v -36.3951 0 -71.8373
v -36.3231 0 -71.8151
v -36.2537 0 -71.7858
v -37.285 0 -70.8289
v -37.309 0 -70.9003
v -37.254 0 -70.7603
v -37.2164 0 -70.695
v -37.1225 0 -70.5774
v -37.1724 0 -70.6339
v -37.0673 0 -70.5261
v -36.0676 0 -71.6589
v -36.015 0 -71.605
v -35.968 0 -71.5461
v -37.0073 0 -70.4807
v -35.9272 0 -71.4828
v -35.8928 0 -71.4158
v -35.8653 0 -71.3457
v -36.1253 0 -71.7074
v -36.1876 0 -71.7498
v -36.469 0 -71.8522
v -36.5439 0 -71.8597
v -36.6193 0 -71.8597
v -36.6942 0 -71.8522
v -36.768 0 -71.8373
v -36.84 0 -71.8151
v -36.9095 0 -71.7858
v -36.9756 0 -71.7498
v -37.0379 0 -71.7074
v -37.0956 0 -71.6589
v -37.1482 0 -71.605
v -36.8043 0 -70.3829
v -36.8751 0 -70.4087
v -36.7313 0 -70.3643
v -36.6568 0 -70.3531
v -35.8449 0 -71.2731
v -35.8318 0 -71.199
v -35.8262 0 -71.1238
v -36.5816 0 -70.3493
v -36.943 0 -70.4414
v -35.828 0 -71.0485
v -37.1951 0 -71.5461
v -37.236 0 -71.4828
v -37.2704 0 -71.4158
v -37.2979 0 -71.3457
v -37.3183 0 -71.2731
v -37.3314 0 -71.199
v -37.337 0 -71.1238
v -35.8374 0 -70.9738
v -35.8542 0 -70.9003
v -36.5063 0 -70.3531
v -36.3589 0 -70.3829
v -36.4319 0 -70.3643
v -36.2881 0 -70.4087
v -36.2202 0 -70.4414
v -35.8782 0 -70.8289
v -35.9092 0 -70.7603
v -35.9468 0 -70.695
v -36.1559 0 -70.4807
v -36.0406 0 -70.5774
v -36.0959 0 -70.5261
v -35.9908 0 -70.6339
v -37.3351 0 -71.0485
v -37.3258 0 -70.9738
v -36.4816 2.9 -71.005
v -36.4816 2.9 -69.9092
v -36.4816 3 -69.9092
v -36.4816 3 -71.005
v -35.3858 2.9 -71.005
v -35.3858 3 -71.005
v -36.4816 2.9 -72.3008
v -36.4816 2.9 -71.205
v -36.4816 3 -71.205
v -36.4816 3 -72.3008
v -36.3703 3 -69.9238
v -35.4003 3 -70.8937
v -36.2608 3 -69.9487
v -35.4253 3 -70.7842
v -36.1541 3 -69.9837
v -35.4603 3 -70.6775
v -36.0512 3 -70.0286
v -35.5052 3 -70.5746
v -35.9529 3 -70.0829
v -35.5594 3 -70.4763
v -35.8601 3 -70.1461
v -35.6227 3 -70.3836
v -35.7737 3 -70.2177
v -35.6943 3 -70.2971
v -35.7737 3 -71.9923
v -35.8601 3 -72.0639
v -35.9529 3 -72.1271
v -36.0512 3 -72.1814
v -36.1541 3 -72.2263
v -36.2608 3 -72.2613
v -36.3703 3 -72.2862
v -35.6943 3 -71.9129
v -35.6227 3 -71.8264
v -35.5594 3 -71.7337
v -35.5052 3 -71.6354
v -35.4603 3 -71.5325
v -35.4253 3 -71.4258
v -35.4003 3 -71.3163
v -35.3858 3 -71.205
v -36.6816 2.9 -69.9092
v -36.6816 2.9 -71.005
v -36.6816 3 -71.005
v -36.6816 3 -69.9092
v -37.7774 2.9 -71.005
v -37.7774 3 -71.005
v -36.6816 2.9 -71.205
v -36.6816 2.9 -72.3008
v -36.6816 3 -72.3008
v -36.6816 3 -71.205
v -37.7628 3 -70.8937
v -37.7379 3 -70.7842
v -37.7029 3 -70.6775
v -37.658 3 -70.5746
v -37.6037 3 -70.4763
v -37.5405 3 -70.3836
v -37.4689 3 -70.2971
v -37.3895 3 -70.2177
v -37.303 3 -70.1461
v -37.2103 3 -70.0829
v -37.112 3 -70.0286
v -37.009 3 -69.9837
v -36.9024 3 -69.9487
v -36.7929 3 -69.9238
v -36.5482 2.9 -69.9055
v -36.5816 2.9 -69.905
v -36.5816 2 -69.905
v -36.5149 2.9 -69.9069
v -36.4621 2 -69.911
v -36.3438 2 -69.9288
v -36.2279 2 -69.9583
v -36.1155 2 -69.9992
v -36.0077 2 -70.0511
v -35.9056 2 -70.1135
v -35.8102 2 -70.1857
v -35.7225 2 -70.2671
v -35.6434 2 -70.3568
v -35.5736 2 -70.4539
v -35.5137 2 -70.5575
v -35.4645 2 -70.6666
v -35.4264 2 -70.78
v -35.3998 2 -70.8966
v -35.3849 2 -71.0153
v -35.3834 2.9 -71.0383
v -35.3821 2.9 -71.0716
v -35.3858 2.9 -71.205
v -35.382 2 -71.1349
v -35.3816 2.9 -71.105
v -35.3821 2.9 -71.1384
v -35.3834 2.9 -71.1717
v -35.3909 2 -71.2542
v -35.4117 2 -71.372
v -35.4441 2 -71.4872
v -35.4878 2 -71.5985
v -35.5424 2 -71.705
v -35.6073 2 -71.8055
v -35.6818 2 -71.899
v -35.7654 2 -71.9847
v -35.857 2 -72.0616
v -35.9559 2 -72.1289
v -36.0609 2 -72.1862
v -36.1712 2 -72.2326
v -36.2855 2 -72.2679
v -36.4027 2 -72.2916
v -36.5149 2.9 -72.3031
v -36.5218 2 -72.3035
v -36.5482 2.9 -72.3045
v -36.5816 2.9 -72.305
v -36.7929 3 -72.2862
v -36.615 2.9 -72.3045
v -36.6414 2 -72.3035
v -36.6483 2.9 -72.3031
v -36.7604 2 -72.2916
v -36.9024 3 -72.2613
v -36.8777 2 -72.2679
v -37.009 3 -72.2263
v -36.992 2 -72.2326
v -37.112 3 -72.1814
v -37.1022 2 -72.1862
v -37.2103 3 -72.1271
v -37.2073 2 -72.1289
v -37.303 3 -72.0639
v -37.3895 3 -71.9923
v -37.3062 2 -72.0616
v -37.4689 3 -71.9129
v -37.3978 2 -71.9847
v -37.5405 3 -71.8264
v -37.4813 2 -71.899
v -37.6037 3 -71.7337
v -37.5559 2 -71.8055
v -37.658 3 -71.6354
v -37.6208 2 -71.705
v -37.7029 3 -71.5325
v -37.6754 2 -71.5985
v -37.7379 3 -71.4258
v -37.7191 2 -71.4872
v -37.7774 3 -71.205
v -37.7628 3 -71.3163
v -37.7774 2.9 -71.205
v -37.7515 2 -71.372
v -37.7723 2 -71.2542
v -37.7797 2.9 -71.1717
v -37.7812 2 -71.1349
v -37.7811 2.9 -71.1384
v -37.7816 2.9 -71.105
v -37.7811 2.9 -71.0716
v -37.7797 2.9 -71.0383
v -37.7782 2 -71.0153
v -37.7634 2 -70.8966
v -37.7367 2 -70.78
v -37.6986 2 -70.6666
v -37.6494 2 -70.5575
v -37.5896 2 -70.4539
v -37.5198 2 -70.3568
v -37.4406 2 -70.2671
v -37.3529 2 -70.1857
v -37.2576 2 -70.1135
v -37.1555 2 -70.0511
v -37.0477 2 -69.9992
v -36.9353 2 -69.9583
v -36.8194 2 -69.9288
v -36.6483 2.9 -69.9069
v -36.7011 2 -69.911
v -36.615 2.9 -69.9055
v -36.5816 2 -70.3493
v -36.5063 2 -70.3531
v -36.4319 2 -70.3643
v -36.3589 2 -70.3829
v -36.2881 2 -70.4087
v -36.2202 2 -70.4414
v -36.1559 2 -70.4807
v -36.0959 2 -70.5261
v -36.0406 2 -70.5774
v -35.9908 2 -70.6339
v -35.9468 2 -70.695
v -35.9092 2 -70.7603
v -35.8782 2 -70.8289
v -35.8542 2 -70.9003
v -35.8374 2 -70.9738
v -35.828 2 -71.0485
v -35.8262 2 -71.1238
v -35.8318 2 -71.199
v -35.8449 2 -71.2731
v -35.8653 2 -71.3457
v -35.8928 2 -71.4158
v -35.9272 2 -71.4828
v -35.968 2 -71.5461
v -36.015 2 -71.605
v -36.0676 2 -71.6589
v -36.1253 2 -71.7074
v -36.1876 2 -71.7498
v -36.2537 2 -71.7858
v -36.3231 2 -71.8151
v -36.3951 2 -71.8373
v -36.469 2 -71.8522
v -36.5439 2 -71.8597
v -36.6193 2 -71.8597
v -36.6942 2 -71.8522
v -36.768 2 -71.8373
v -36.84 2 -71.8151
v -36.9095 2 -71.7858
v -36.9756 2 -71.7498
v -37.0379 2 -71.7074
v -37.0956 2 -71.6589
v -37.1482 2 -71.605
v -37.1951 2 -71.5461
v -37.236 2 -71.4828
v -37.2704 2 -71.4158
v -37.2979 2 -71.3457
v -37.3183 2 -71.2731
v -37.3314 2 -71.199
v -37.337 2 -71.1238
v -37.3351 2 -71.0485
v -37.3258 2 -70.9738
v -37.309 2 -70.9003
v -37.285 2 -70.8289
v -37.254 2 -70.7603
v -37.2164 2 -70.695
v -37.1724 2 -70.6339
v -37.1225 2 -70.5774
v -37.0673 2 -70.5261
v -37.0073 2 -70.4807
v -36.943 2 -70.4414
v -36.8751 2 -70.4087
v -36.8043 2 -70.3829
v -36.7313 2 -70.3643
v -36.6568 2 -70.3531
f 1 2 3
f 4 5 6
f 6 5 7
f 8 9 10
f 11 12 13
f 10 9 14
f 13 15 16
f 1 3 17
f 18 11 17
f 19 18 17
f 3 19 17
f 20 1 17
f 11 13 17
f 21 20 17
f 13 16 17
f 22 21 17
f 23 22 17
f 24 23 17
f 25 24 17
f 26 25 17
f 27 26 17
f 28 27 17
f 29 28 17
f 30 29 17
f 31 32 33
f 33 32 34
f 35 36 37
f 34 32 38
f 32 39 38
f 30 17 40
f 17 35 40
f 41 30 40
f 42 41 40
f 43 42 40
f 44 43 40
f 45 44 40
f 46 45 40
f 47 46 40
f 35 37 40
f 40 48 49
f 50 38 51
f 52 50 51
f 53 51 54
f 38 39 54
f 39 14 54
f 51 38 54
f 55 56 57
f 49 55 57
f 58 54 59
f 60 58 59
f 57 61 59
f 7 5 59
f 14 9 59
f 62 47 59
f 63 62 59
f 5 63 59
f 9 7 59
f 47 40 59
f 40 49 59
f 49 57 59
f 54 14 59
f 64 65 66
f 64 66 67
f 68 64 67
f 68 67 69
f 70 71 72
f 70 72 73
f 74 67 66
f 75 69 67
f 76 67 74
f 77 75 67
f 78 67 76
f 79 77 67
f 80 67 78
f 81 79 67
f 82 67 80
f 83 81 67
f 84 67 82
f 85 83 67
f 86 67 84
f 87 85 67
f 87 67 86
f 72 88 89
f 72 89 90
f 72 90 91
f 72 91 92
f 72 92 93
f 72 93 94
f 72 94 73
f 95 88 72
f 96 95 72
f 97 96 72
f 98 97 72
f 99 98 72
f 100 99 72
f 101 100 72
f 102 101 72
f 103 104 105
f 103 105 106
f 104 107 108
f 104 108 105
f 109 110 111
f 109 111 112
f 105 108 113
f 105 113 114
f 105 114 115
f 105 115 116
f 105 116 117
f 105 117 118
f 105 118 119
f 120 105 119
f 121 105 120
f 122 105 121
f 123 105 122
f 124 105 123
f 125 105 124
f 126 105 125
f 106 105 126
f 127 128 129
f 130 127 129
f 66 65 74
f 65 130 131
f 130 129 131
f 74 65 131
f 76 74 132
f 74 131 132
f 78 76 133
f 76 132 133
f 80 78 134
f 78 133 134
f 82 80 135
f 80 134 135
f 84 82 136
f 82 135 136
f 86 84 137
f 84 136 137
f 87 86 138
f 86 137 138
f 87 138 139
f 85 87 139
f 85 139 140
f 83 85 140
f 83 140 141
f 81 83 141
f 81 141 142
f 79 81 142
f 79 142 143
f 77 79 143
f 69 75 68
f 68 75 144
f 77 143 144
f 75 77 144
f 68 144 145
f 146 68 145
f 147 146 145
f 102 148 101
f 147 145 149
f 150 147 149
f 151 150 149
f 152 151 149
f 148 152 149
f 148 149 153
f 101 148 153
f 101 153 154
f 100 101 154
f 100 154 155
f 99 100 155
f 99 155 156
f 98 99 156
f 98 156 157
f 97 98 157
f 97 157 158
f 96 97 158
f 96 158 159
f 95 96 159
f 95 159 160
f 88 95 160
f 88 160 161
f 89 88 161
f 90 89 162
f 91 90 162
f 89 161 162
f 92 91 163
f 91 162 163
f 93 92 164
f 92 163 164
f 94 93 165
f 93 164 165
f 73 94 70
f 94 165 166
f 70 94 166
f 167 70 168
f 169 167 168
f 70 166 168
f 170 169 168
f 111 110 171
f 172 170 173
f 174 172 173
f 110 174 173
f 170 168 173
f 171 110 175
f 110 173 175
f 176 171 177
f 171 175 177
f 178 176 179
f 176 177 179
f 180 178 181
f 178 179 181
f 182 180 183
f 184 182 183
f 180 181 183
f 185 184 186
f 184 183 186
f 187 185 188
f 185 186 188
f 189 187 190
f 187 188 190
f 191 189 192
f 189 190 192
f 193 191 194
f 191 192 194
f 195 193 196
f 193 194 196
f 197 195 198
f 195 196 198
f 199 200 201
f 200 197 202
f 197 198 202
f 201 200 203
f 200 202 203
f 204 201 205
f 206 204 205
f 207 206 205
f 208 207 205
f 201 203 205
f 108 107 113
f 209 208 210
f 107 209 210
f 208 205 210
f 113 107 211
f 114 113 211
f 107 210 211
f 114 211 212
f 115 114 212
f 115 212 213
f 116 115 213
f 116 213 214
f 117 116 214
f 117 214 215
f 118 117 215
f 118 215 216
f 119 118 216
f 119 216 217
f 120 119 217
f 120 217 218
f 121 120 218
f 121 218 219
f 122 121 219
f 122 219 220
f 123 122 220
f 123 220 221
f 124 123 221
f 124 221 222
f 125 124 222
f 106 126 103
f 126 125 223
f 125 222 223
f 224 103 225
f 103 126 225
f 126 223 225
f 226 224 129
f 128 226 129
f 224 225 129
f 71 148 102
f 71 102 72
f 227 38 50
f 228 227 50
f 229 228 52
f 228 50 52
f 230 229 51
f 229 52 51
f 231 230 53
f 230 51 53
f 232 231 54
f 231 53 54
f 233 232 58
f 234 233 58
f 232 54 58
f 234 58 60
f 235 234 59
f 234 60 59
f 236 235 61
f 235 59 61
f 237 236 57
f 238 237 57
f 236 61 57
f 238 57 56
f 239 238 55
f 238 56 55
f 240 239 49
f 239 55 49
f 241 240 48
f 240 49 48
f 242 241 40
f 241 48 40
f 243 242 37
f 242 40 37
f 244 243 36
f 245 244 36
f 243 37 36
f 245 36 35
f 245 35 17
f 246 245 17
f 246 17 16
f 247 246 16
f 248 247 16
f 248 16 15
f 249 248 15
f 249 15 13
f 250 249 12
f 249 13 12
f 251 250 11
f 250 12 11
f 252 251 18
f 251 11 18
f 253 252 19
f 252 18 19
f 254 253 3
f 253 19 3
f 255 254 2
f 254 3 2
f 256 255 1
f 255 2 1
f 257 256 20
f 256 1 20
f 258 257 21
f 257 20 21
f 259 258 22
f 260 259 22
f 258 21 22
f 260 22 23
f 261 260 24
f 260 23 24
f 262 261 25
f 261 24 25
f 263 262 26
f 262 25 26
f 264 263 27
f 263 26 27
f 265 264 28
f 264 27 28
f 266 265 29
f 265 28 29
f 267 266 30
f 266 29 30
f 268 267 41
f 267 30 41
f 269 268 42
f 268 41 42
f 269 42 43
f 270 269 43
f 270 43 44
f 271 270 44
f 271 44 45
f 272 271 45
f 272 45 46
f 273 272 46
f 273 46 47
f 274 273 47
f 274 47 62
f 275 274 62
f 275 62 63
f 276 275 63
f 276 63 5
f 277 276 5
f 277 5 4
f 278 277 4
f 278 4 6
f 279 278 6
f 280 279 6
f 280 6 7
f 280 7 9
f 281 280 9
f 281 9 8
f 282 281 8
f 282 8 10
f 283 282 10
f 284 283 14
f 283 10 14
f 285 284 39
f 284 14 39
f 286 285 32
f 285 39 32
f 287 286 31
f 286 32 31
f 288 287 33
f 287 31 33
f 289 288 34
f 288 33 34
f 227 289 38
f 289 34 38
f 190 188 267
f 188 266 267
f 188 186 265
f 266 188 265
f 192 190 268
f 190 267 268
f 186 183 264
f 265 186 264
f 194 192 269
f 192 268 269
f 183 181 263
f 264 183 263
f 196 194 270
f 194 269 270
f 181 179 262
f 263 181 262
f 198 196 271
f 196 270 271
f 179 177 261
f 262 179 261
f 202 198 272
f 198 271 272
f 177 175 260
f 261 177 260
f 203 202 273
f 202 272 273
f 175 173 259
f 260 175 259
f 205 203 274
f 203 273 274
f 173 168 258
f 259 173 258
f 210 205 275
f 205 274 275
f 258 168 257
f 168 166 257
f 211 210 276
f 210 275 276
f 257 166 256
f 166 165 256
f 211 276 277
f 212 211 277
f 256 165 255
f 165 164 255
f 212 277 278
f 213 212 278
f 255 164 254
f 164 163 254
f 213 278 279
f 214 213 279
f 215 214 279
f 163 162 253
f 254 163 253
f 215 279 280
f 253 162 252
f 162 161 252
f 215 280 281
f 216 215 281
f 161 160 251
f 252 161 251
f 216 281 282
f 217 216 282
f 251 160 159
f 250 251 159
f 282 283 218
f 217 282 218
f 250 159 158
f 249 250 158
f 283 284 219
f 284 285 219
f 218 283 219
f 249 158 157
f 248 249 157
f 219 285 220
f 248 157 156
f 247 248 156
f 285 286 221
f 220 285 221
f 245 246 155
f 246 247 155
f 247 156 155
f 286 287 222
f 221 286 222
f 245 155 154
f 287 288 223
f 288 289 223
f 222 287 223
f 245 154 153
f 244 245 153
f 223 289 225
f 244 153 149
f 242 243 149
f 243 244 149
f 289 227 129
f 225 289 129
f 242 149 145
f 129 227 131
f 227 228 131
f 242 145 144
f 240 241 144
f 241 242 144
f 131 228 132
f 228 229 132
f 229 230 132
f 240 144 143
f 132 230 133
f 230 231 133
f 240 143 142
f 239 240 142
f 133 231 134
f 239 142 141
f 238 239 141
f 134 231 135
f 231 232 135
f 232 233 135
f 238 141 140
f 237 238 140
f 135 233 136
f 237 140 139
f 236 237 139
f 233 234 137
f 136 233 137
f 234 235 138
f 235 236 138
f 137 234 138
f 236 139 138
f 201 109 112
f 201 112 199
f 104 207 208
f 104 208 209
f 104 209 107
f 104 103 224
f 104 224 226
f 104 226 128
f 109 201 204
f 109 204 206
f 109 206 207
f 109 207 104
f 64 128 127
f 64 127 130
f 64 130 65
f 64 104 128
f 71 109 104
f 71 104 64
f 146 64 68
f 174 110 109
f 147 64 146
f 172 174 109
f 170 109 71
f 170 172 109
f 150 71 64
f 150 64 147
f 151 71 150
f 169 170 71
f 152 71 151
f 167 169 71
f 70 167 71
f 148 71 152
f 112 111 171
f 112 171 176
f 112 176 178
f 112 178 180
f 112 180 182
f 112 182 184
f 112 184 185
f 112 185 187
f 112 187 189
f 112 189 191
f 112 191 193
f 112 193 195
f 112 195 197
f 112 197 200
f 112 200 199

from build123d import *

# Parameters (mm, degrees)
SKETCH1_R           = 0.75565
BOSS_EXTRUDE1_DEPTH = 2
SKETCH2_R           = 1.2
BOSS_EXTRUDE2_DEPTH = 1
CUT_EXTRUDE1_START  = -0.1
CUT_EXTRUDE1_DEPTH  = 0.1


with BuildPart() as part:
    # Sketch1 → Boss-Extrude1 (new body)
    with BuildSketch(Plane(origin=(0, 0, 0), x_dir=(1, 0, 0), z_dir=(0, 1, 0))):
        with Locations(Location((-36.581586629, 71.104998538, 0), (0, 0, 270))):
            Circle(SKETCH1_R)
    extrude(amount=BOSS_EXTRUDE1_DEPTH)

    # Sketch2 → Boss-Extrude2 (add)
    with BuildSketch(Plane(origin=(0, 2, 0), x_dir=(1, 0, 0), z_dir=(0, 1, 0))):
        with Locations(Location((-36.581586629, 71.104998538, 0), (0, 0, 270))):
            Circle(SKETCH2_R)
    extrude(amount=BOSS_EXTRUDE2_DEPTH)

    # Sketch3 → Cut-Extrude1 (cut)
    with BuildSketch(Plane(origin=(0, 3, 0), x_dir=(1, 0, 0), z_dir=(0, 1, 0)).offset(CUT_EXTRUDE1_START)):
        with BuildLine():
            ThreePointArc((-36.481586629, 72.300824612), (-36.531543094, 72.303954603), (-36.581586629, 72.304998538))
            ThreePointArc((-36.581586629, 72.304998538), (-36.631630165, 72.303954603), (-36.681586629, 72.300824612))
            Line((-36.681586629, 72.300824612), (-36.681586629, 71.204998538))
            Line((-36.681586629, 71.204998538), (-37.777412704, 71.204998538))
            ThreePointArc((-37.777412704, 71.204998538), (-37.780542694, 71.155042073), (-37.781586629, 71.104998538))
            ThreePointArc((-37.781586629, 71.104998538), (-37.780542694, 71.054955003), (-37.777412704, 71.004998538))
            Line((-37.777412704, 71.004998538), (-36.681586629, 71.004998538))
            Line((-36.681586629, 71.004998538), (-36.681586629, 69.909172464))
            ThreePointArc((-36.681586629, 69.909172464), (-36.631630165, 69.906042474), (-36.581586629, 69.904998538))
            ThreePointArc((-36.581586629, 69.904998538), (-36.531543094, 69.906042474), (-36.481586629, 69.909172464))
            Line((-36.481586629, 69.909172464), (-36.481586629, 71.004998538))
            Line((-36.481586629, 71.004998538), (-35.385760555, 71.004998538))
            ThreePointArc((-35.385760555, 71.004998538), (-35.382630565, 71.054955003), (-35.381586629, 71.104998538))
            ThreePointArc((-35.381586629, 71.104998538), (-35.382630565, 71.155042073), (-35.385760555, 71.204998538))
            Line((-35.385760555, 71.204998538), (-36.481586629, 71.204998538))
            Line((-36.481586629, 71.204998538), (-36.481586629, 72.300824612))
        make_face()
    extrude(amount=CUT_EXTRUDE1_DEPTH, mode=Mode.SUBTRACT)


solid = part.part
